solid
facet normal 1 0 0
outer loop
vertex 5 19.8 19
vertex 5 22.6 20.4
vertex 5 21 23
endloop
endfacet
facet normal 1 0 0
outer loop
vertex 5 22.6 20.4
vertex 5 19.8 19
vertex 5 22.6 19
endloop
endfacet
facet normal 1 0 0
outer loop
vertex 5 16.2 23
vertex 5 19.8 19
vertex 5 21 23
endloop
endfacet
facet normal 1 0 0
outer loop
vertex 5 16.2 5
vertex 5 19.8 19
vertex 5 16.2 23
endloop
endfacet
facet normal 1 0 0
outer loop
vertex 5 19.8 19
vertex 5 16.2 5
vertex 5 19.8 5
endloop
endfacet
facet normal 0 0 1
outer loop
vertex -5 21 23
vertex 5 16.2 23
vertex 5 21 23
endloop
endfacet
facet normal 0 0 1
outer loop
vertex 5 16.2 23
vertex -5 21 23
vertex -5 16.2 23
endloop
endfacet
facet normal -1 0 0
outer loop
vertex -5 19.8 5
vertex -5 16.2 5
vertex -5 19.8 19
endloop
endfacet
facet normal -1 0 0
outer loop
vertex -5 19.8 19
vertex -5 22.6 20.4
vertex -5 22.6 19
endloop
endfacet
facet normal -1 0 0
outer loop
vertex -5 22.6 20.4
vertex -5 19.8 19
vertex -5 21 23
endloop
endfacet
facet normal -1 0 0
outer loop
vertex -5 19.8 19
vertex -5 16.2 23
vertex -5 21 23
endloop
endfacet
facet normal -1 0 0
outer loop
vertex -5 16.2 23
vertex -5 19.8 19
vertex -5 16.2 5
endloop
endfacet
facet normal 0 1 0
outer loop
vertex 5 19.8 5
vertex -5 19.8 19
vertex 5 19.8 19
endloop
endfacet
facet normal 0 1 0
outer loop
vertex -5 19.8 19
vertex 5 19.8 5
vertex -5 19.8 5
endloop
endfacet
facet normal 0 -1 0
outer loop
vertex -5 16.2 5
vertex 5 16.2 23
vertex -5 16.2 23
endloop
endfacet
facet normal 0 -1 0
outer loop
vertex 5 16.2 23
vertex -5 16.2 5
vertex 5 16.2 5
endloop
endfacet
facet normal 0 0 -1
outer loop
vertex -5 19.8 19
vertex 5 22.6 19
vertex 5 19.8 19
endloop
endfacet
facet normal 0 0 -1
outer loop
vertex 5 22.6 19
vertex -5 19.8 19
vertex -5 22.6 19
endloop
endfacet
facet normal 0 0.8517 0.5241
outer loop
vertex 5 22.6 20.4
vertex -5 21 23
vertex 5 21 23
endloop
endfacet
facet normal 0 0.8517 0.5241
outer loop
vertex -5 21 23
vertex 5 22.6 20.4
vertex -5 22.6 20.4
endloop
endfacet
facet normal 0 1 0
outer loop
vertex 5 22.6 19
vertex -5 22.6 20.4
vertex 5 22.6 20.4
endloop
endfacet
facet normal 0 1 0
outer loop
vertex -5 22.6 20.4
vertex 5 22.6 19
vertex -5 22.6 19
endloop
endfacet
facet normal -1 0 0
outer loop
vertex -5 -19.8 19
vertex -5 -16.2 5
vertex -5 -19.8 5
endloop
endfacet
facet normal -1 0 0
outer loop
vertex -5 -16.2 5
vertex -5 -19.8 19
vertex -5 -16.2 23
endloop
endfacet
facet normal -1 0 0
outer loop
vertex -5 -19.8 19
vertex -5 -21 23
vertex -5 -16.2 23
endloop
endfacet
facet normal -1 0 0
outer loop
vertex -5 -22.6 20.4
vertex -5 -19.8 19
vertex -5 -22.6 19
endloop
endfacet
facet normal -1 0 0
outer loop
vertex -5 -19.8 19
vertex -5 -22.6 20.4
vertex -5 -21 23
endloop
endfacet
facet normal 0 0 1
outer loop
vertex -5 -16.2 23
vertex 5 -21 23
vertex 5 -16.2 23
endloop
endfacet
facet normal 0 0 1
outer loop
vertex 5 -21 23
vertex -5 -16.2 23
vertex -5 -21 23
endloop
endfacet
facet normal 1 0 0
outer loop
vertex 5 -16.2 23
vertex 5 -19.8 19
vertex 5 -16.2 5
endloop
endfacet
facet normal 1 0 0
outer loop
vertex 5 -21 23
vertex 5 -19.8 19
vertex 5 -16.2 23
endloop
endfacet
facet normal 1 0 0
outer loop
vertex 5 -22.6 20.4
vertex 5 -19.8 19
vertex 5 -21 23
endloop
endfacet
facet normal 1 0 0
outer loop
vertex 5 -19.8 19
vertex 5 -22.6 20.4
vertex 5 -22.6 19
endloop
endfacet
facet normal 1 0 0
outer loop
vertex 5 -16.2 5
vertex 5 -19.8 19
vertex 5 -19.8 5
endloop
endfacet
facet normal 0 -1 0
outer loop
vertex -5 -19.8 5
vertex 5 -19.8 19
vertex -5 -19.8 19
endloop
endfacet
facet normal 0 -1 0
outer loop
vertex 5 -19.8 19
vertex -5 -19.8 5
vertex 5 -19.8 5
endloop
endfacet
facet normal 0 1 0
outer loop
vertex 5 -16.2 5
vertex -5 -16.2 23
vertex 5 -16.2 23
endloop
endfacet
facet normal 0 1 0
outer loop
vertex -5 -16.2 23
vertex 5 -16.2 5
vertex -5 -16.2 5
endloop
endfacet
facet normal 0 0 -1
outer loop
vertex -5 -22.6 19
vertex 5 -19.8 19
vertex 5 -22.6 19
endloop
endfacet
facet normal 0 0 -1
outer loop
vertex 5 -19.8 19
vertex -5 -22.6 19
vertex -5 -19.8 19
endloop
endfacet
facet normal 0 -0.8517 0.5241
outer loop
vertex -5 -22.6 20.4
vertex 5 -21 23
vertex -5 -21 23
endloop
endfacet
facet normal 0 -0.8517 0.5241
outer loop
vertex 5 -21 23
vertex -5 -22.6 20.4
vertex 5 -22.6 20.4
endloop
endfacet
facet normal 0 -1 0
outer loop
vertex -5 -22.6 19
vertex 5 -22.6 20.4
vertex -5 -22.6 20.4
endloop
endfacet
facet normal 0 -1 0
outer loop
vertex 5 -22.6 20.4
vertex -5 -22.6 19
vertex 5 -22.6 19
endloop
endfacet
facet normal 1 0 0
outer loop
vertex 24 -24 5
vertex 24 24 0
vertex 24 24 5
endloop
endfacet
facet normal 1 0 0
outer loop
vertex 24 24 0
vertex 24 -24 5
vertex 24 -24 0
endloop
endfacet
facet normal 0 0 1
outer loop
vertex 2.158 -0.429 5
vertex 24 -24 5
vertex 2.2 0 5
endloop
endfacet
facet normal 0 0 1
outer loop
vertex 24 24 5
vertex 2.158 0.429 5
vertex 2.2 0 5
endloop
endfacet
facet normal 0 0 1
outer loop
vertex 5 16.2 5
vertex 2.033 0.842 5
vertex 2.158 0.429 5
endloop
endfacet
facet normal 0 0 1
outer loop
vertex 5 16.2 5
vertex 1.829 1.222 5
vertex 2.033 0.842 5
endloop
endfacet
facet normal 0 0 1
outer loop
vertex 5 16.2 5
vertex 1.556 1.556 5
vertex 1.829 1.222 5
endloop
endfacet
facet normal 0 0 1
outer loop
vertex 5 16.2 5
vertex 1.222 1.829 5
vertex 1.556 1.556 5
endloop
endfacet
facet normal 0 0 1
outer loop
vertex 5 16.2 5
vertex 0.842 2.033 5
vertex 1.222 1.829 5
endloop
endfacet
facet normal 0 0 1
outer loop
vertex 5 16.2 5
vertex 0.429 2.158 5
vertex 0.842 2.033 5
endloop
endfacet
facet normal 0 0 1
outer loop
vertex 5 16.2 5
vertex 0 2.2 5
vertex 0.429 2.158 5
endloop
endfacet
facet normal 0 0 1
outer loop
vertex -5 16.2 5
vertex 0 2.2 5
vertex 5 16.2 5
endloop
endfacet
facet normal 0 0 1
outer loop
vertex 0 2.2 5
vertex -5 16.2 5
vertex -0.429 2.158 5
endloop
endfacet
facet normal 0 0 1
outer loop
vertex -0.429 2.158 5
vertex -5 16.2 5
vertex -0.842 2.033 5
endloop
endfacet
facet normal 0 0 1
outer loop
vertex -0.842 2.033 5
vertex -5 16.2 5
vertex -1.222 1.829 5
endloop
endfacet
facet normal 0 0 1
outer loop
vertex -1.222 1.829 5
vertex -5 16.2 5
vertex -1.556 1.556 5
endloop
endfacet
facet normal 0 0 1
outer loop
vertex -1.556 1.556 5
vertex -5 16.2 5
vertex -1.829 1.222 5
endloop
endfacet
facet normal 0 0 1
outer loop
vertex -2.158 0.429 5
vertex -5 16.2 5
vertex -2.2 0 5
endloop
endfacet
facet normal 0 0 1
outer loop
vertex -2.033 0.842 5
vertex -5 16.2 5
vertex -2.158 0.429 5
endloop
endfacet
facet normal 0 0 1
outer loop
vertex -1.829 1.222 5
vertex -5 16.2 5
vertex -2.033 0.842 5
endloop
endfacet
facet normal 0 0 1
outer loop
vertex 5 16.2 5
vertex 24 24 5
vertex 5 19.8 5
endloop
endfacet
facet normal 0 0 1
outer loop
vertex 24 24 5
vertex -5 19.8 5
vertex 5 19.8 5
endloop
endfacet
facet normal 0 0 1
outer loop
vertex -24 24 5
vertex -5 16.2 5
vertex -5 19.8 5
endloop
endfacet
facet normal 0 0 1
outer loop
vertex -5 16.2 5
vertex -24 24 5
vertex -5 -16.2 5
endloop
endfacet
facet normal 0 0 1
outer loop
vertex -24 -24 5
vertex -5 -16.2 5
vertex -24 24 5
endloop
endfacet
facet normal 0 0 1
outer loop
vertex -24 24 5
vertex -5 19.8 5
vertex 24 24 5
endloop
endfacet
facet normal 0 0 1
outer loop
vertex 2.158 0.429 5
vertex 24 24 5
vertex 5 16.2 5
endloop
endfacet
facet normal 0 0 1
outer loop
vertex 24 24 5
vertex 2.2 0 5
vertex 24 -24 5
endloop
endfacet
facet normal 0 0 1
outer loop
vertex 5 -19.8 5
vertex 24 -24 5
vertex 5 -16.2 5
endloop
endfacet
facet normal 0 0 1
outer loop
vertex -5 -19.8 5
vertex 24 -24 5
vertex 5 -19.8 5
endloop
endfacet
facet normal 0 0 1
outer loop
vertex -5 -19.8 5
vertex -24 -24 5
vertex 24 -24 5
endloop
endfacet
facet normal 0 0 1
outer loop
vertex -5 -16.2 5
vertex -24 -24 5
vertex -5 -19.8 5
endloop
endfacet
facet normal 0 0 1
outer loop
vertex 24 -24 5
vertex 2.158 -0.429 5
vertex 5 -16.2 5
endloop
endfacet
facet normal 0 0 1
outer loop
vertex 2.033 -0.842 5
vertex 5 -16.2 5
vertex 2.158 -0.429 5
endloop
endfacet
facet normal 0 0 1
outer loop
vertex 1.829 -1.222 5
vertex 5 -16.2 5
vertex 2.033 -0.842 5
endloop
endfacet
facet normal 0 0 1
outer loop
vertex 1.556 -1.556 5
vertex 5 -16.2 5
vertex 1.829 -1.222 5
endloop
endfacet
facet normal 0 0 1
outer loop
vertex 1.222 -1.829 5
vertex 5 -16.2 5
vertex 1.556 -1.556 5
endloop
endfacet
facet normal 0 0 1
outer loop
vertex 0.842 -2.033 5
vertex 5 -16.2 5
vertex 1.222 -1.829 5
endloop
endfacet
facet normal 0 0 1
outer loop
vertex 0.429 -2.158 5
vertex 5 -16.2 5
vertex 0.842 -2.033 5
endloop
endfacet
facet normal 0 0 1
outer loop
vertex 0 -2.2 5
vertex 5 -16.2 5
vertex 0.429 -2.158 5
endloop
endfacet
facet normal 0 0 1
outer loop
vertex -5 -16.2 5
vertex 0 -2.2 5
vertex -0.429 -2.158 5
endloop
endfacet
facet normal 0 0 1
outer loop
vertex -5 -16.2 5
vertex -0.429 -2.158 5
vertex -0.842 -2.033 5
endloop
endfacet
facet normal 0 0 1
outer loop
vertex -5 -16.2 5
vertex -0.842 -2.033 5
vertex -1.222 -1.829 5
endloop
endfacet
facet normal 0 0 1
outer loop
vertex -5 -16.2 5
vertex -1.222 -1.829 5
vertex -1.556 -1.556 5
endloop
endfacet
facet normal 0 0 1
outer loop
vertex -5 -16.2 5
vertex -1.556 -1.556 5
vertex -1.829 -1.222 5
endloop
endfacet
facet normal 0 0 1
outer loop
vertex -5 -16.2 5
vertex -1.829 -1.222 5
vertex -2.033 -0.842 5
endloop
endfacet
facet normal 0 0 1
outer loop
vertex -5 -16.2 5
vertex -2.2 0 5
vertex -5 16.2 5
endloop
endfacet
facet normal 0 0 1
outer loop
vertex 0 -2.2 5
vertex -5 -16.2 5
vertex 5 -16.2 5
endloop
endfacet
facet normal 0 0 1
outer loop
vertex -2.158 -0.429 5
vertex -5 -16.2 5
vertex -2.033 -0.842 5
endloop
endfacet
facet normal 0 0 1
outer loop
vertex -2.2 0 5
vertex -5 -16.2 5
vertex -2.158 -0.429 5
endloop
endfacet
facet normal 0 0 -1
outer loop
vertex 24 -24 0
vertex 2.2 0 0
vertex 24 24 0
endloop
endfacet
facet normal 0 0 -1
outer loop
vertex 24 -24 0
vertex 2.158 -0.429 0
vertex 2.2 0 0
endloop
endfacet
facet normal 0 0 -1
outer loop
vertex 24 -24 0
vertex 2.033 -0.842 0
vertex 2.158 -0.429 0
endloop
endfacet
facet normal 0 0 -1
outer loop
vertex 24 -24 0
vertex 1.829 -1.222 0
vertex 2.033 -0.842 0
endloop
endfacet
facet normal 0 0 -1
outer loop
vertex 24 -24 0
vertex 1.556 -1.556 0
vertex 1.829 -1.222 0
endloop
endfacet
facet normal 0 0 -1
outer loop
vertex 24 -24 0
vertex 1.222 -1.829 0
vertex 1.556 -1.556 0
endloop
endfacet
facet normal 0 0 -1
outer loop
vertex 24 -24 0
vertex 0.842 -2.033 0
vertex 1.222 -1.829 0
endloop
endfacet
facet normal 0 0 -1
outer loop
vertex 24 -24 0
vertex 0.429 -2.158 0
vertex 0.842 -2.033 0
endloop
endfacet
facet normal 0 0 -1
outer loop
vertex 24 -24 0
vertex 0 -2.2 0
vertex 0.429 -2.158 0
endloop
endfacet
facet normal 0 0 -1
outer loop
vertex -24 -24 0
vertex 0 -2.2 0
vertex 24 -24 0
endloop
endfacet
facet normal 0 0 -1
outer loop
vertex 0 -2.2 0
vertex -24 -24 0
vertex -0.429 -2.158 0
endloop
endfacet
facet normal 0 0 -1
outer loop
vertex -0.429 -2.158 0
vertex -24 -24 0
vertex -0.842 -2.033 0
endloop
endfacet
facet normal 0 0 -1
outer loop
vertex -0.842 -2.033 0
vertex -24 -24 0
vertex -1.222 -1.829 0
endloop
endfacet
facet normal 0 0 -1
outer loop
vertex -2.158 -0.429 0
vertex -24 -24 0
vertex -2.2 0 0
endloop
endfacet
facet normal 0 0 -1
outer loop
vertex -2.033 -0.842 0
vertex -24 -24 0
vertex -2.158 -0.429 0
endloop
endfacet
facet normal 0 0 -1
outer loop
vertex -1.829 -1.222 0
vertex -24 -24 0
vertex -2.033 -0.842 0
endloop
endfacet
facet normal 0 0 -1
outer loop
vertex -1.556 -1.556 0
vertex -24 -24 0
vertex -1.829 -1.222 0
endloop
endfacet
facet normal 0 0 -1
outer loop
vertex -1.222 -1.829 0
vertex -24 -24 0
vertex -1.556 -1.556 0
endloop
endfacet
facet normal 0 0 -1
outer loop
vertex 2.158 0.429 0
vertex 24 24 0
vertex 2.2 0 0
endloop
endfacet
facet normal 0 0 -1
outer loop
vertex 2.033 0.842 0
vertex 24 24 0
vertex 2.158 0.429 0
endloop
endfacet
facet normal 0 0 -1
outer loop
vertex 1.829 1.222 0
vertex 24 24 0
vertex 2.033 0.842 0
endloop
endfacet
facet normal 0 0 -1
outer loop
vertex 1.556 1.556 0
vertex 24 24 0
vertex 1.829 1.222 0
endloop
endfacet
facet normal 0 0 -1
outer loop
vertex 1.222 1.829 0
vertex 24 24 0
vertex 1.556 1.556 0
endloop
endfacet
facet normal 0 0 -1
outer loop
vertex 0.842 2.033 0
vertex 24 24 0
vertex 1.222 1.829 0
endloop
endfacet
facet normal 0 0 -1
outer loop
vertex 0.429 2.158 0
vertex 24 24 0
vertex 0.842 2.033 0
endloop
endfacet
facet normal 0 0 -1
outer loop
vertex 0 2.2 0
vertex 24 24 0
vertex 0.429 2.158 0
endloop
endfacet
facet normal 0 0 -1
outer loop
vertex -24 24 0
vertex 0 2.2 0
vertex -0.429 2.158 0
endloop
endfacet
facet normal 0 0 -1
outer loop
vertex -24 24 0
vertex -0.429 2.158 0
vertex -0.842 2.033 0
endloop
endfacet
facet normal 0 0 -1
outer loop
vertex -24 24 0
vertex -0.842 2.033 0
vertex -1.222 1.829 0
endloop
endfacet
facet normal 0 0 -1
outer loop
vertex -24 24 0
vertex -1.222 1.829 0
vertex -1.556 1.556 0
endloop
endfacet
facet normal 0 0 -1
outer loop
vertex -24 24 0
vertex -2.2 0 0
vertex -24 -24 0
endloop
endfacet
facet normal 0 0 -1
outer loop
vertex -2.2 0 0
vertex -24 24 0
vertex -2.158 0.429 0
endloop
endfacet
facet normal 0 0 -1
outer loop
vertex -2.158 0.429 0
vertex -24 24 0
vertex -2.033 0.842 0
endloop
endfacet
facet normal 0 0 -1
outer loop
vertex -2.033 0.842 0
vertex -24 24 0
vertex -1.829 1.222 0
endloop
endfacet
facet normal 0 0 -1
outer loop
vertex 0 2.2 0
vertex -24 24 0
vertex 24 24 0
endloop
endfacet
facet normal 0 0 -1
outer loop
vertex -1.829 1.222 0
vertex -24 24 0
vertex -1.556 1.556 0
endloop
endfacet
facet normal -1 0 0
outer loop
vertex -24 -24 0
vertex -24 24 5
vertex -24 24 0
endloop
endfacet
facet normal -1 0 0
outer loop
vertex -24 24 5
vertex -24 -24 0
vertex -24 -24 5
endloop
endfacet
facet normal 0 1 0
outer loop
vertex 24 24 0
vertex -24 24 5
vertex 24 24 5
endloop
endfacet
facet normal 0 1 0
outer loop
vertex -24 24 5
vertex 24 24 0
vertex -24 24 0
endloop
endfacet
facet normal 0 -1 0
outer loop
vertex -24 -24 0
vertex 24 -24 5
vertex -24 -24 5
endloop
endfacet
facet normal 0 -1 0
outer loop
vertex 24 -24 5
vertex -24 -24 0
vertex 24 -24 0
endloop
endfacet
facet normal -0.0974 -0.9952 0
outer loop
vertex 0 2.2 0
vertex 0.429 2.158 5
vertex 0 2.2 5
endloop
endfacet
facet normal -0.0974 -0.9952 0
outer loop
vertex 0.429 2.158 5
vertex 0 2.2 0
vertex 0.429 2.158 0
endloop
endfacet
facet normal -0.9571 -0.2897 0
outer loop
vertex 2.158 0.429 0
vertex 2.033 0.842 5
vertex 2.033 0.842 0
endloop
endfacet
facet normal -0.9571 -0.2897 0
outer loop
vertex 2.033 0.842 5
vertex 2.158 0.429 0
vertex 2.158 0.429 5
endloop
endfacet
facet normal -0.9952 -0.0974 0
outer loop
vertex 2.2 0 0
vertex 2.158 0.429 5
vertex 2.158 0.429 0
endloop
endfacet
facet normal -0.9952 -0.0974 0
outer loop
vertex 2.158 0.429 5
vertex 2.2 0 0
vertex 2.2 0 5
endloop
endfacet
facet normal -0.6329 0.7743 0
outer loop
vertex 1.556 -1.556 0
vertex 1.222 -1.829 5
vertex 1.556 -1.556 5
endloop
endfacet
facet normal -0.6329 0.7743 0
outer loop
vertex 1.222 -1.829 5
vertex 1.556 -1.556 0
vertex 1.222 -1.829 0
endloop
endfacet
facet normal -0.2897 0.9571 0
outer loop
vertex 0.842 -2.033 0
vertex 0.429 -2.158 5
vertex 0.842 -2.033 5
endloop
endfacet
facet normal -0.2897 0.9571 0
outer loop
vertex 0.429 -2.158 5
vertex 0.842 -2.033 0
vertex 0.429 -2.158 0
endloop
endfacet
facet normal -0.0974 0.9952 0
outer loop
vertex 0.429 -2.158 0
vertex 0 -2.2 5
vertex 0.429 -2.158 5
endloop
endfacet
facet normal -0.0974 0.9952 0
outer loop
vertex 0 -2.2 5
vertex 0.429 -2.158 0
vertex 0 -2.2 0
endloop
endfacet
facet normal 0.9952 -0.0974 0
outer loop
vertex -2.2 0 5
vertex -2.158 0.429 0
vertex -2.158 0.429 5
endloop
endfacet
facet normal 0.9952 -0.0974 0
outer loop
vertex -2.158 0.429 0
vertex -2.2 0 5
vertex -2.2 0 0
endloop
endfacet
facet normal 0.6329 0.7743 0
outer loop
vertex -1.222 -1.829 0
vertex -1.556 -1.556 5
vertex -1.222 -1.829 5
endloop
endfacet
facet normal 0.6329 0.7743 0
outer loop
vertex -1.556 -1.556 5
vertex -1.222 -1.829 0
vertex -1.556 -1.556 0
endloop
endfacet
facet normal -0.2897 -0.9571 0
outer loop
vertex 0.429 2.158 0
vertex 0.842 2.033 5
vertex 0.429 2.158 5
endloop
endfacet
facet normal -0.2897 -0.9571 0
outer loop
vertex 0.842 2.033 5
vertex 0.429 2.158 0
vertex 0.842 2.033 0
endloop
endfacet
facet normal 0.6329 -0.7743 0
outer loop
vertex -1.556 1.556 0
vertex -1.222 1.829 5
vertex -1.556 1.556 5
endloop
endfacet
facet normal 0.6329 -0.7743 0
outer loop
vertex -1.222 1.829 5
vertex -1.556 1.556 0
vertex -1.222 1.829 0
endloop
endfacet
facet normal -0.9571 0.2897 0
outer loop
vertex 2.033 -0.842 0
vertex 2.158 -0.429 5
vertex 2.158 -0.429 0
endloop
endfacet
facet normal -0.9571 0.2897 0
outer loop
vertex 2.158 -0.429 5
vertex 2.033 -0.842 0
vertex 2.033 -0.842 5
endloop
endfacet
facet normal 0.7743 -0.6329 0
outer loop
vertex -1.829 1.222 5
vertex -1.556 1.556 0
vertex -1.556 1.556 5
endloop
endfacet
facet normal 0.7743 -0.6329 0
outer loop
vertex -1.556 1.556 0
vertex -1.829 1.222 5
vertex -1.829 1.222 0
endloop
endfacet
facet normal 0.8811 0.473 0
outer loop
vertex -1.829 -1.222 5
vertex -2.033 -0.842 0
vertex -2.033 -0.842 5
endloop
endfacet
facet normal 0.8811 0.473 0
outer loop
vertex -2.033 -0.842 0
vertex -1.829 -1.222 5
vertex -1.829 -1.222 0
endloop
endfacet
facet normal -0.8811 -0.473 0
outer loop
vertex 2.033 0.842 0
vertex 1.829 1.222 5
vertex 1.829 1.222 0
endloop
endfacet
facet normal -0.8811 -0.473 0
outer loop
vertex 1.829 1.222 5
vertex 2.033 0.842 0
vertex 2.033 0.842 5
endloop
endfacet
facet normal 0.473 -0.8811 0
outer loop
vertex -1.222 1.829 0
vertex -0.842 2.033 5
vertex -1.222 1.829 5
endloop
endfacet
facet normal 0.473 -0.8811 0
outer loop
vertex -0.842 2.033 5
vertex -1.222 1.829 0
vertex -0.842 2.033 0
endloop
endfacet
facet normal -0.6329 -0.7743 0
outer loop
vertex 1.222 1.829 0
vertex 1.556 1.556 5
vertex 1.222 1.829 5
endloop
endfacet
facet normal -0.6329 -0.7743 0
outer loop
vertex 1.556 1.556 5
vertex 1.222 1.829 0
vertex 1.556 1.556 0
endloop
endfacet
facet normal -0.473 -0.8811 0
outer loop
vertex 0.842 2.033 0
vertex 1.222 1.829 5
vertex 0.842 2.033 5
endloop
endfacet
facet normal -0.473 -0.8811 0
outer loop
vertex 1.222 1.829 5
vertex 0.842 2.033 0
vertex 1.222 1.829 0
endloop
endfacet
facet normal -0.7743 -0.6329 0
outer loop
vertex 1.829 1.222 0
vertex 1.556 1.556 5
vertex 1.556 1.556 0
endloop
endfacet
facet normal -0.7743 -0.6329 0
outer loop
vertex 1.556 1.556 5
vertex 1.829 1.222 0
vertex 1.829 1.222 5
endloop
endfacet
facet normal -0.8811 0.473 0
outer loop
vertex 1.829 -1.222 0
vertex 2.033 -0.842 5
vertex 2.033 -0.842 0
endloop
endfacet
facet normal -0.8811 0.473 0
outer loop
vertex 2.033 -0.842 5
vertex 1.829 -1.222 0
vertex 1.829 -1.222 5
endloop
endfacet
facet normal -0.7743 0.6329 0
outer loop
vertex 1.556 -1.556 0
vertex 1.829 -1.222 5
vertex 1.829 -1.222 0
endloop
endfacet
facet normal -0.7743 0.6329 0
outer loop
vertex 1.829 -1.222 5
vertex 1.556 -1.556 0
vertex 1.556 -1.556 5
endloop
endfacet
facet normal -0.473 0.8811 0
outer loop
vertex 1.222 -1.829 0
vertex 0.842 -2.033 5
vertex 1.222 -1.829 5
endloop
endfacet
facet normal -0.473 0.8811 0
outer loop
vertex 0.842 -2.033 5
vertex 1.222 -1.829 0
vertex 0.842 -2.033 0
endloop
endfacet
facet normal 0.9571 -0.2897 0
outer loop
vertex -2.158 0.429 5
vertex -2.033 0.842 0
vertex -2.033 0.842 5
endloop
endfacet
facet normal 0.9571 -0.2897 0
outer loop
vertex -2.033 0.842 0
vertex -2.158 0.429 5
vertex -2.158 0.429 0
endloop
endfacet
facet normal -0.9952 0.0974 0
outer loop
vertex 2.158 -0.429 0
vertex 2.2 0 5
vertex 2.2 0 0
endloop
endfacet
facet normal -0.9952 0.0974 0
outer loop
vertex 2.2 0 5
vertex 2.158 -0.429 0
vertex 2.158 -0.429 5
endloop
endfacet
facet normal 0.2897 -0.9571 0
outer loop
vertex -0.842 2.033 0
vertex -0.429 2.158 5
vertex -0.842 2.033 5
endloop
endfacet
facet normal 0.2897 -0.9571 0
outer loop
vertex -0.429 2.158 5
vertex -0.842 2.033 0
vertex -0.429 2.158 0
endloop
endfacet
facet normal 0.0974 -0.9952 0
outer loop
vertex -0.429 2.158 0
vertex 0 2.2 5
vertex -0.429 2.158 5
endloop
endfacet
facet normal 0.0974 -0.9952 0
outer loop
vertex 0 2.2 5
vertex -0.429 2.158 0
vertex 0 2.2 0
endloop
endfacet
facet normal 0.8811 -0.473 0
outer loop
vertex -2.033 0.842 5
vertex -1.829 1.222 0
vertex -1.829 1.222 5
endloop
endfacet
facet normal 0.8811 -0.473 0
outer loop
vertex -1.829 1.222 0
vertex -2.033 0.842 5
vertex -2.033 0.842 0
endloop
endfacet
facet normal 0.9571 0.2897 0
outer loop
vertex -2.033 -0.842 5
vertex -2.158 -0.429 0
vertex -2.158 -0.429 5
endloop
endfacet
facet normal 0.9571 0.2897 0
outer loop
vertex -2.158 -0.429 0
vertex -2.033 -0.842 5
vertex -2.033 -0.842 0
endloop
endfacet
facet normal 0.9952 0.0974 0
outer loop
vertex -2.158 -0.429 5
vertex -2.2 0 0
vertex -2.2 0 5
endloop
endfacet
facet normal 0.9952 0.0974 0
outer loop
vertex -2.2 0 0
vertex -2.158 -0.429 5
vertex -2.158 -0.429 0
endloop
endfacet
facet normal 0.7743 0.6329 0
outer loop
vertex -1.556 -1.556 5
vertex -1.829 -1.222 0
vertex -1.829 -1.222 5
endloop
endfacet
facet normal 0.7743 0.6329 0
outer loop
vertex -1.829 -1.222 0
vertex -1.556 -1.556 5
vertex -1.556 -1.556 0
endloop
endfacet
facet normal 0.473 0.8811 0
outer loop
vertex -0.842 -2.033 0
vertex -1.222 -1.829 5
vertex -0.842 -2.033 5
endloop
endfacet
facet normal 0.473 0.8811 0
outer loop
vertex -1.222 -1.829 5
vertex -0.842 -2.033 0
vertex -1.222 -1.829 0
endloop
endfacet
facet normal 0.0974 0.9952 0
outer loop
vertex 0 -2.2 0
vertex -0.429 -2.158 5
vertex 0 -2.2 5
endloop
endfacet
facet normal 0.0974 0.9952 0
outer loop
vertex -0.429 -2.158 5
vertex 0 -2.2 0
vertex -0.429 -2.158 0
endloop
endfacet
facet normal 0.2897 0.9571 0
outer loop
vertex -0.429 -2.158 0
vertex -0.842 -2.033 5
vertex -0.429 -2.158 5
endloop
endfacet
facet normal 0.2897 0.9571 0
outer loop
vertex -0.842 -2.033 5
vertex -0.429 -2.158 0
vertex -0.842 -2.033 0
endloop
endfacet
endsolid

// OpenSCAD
$fn = 32;

// ----------------------------------------------------------------------
// Snap-fit latch: 2 arms, 18 mm tall, 3 mm undercut hooks
// ----------------------------------------------------------------------

// --- parameters (mm) ---
base_d = 48;              // base plate depth
base_h = 5;               // base plate thickness
span = 36;                // distance between opposite arms
arm_t = 3.6;              // arm thickness
arm_d = 10;               // arm width
height = 18;              // free arm length
head_len = 3;             // hook reach
head_h = 4;               // hook height
lead = 1.4;               // lead-in ramp thickness
bore_d = 4.4;             // base fixing bore
top_z = 23;               // height of the arm tips above the base

arms = 2;

difference() {
  union() {
    /* base plate, centred on the arm ring */
    translate([-24, -24, 0]) cube([base_d, base_d, base_h]);
    for (a = [0 : 360 / arms : 359]) rotate([0, 0, a]) {
    /* arm, sunk 0.5 mm into the base */
    translate([-arm_d / 2, span / 2 - arm_t / 2, base_h - 0.5]) cube([arm_d, arm_t, height + 0.5]);
    /* hook: a convex hull of a tall inner block and a thin outer lip
       gives a flat undercut below and a lead-in ramp on top */
    hull() {
      translate([-arm_d / 2, span / 2 + arm_t / 2 - 0.6, top_z - head_h]) cube([arm_d, lead + 0.4, head_h]);
      translate([-arm_d / 2, span / 2 + arm_t / 2 - 0.2, top_z - head_h]) cube([arm_d, head_len, lead]);
    }
    }
  }
  translate([0, 0, -2.5]) cylinder(h = base_h + 5, d = bore_d);
}
